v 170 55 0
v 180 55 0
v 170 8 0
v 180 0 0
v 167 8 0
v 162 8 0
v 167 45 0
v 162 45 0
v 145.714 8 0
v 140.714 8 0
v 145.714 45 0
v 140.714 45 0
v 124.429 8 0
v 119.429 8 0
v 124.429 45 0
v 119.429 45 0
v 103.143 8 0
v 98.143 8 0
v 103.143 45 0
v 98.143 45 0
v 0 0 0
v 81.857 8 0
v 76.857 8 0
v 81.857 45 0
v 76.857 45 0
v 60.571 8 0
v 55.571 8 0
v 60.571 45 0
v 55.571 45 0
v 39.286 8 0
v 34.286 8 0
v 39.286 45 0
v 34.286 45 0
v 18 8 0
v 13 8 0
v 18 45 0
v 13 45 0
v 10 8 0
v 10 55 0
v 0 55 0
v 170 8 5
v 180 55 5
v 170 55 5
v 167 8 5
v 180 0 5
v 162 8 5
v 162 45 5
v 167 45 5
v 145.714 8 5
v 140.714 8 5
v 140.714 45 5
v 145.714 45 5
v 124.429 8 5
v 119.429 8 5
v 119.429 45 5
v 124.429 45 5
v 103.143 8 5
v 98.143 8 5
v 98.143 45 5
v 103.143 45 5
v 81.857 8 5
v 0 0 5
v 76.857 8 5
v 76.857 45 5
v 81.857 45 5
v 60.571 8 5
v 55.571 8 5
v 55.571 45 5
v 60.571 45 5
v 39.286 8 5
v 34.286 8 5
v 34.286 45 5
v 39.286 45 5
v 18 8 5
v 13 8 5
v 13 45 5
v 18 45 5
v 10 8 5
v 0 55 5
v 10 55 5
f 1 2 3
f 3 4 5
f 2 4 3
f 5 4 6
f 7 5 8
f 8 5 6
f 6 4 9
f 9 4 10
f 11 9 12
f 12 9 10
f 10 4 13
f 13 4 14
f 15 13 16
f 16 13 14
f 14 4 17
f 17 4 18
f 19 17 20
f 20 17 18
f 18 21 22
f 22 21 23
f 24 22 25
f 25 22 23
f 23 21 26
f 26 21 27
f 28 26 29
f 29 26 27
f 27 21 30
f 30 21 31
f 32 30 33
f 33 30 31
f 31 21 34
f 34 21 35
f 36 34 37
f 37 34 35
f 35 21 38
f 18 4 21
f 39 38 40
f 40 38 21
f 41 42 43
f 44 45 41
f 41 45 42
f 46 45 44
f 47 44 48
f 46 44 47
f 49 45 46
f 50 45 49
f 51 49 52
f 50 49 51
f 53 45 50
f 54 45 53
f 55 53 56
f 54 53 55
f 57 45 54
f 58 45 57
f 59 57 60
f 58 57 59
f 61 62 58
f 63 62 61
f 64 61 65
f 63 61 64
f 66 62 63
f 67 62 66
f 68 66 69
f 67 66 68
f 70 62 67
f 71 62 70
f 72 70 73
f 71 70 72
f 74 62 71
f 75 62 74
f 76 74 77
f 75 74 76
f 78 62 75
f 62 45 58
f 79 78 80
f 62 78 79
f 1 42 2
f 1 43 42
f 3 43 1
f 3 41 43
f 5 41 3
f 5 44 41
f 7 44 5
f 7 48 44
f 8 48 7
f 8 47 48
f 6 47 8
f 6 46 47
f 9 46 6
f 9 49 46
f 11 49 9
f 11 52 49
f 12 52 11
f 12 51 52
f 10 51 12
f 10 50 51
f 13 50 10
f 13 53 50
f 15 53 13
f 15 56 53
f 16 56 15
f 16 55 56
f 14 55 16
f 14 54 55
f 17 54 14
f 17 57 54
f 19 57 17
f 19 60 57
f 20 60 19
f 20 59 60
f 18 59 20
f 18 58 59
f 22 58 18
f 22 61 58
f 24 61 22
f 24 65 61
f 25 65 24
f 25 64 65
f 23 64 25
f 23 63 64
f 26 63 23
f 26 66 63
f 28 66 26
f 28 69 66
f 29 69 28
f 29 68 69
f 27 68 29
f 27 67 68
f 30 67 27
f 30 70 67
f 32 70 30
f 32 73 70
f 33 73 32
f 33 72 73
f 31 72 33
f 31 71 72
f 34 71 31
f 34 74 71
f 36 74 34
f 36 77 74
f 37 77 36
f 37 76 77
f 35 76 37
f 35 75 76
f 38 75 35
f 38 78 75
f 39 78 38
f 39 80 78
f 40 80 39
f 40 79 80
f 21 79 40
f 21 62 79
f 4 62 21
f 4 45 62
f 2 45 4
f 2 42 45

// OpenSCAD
$fn = 32;

// ----------------------------------------------------------------------
// Guard grille: 8 slats over a 180 x 55 mm plate
// ----------------------------------------------------------------------

// --- parameters (mm) ---
profile_height = 5;       // extrusion height
profile_points = 40;      // points of the closed outline

profile = [[0, 0], [180, 0], [180, 55], [170, 55], [170, 8], [167, 8], [167, 45], [162, 45], [162, 8], [145.714, 8], [145.714, 45], [140.714, 45], [140.714, 8], [124.429, 8], [124.429, 45], [119.429, 45], [119.429, 8], [103.143, 8], [103.143, 45], [98.143, 45], [98.143, 8], [81.857, 8], [81.857, 45], [76.857, 45], [76.857, 8], [60.571, 8], [60.571, 45], [55.571, 45], [55.571, 8], [39.286, 8], [39.286, 45], [34.286, 45], [34.286, 8], [18, 8], [18, 45], [13, 45], [13, 8], [10, 8], [10, 55], [0, 55]];  // single closed polygon, 40 points, counter clockwise

// --- the one profile operation ---
linear_extrude(height = profile_height) polygon(points = profile);
